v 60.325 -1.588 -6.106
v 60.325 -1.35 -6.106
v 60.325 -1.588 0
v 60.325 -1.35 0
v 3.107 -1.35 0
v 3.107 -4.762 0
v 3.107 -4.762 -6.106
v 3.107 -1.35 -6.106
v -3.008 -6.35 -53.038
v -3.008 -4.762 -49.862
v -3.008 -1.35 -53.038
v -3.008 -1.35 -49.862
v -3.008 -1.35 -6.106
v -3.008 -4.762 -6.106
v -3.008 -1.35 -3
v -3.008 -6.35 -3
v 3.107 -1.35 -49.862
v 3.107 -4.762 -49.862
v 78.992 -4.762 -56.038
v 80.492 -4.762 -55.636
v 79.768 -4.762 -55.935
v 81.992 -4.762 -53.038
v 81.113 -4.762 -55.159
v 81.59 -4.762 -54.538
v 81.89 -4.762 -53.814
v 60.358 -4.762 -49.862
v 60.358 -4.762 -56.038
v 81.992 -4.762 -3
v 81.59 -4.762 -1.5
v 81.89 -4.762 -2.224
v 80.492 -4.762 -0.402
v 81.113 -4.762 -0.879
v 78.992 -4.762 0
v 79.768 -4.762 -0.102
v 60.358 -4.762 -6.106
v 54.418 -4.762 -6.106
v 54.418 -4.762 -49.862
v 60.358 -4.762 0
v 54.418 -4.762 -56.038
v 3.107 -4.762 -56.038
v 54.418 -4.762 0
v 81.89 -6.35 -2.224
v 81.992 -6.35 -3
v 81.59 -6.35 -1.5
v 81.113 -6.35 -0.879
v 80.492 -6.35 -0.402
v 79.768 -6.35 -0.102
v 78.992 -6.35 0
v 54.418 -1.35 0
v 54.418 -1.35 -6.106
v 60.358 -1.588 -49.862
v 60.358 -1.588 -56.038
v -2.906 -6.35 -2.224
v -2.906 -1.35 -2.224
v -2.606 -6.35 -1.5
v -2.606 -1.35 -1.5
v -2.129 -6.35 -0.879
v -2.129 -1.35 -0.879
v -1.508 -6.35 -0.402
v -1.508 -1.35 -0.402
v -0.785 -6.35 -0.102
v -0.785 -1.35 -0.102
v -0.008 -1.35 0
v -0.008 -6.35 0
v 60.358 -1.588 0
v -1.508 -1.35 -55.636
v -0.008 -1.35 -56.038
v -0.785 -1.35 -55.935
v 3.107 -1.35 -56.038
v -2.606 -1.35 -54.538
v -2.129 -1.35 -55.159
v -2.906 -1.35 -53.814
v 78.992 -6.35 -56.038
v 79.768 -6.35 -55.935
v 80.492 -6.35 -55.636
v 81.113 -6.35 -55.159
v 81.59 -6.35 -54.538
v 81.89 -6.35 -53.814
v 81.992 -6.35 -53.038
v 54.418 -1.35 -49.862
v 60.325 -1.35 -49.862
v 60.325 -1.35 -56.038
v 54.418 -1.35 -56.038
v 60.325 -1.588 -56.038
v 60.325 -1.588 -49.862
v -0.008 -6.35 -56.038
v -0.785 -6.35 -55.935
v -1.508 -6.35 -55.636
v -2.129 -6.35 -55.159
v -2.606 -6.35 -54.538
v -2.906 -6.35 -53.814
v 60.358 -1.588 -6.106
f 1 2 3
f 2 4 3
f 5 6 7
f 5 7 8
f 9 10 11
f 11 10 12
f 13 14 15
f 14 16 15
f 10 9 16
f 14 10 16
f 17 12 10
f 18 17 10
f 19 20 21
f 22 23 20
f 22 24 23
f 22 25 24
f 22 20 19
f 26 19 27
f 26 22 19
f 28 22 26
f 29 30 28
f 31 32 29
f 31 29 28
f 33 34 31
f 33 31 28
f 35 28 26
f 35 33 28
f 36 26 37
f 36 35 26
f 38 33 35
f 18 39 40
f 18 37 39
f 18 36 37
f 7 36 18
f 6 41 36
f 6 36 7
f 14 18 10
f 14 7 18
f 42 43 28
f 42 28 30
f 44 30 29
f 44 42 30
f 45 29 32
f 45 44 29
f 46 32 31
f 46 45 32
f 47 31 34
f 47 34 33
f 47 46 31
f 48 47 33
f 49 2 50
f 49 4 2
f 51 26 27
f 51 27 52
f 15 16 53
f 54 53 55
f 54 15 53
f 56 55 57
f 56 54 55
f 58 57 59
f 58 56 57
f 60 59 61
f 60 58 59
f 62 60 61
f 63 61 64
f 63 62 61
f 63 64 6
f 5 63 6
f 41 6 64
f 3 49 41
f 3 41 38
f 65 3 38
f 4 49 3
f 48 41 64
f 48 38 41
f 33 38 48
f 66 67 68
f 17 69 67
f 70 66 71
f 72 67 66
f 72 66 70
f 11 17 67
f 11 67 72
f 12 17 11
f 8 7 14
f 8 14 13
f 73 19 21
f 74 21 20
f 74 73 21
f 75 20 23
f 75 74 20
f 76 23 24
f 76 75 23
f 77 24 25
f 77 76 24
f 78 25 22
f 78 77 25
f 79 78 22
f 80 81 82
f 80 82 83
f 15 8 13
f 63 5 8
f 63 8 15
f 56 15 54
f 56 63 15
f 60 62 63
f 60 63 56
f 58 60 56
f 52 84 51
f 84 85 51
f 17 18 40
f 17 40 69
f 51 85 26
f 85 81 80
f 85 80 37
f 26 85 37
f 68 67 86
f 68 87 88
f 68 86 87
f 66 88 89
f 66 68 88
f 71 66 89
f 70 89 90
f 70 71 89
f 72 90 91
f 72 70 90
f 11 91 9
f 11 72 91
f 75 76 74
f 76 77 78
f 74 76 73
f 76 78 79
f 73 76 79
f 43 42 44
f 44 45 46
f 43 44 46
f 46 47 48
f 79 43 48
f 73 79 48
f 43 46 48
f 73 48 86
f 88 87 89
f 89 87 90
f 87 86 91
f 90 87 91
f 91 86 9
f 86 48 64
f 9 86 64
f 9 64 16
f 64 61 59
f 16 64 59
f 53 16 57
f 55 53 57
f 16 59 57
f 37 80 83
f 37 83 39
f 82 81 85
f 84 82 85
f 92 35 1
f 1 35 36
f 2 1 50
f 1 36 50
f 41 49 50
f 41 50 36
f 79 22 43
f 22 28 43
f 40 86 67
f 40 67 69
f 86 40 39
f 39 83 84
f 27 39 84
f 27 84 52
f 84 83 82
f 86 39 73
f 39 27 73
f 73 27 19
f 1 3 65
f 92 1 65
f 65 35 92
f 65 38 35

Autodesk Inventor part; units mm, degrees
ref_plane "YZ Plane" through (0, 0, 0) normal (1, 0, 0) x (0, 1, 0)
ref_plane "XZ Plane" through (0, 0, 0) normal (0, 1, 0) x (-1, 0, 0)
ref_plane "XY Plane" through (0, 0, 0) normal (0, 0, 1) x (1, 0, 0)
sketch "Sketch1" plane through (0, 0, 0) normal (0, 0, 1) x (1, 0, 0)
  line L0 (-3.0081, 0) -> (-3.0081, -1.35)
  line L1 (-0.0086, -1.35) -> (-3.0081, -1.35) projected
  line L2 (81.9919, -1.35) -> (78.9914, -1.35) projected
  line L3 (78.9914, -1.35) -> (-0.0086, -1.35) projected
  line L4 (-3.0081, -1.35) -> (81.9919, -1.35)
  line L5 (81.9919, -1.35) -> (81.9919, -6.35)
  line L6 (81.9919, -6.35) -> (-3.0081, -6.35)
  line L7 (-3.0081, -6.35) -> (-3.0081, -1.35)
  line L8 (0, 12.6) -> (65.5305, 12.6) projected
  line L9 (0, 0) -> (0, 12.6) projected
  line L10 (0, 0) -> (3.1074, 0) projected
  line L11 (3.1074, 0) -> (3.1074, 4.1) projected
  line L12 (3.1074, 4.1) -> (39.418, 4.1) projected
  line L13 (39.418, 4.1) -> (39.418, 6.6) projected
  line L14 (39.418, 6.6) -> (54.418, 6.6) projected
  line L15 (54.418, 6.6) -> (54.418, 0) projected
  line L16 (54.418, 0) -> (60.3584, 0) projected
  line L17 (60.3584, 0) -> (60.3584, 1.0153) projected
  line L18 (60.3584, 1.0153) -> (65.5305, 1.0153) projected
  line L19 (65.5305, 1.0153) -> (65.5305, 12.6) projected
  dimension "d0" = 5
extrude "Extrusion1" add sketch "Sketch1" against normal blind 56.0375 contours L3 L2 L5 L6 L7 L1
fillet "Fillet1" radius 3 4 edges at (-3.0081, -3.85, 0) (-3.0081, -3.85, -56.0375) (81.9919, -3.85, 0) (81.9919, -3.85, -56.0375)
sketch "Sketch2" plane through (0, 0, 0) normal (0, 0, 1) x (1, 0, 0)
  line L0 (0, 12.6) -> (65.5305, 12.6) projected
  line L1 (0, 0) -> (0, 12.6) projected
  line L2 (0, 0) -> (3.1074, 0) projected
  line L3 (3.1074, 0) -> (3.1074, 4.1) projected
  line L4 (3.1074, 4.1) -> (39.418, 4.1) projected
  line L5 (39.418, 4.1) -> (39.418, 6.6) projected
  line L6 (39.418, 6.6) -> (54.418, 6.6) projected
  line L7 (54.418, 6.6) -> (54.418, 0) projected
  line L8 (54.418, 0) -> (60.3584, 0) projected
  line L9 (60.3584, 0) -> (60.3584, 1.0153) projected
  line L10 (60.3584, 1.0153) -> (65.5305, 1.0153) projected
  line L11 (65.5305, 1.0153) -> (65.5305, 12.6) projected
  line L12 (-0.0081, -1.35) -> (78.9919, -1.35) projected
  line L13 (3.1074, -1.35) -> (54.418, -1.35)
  line L14 (54.418, -1.35) -> (54.418, -4.7625)
  line L15 (54.418, -4.7625) -> (3.1074, -4.7625)
  line L16 (3.1074, -4.7625) -> (3.1074, -1.35)
  line L17 (60.3584, -1.5875) -> (89.6562, -1.5875)
  line L18 (89.6562, -1.5875) -> (89.6562, -4.7625)
  line L19 (89.6562, -4.7625) -> (60.3584, -4.7625)
  line L20 (60.3584, -4.7625) -> (60.3584, -1.5875)
extrude "Extrusion2" cut sketch "Sketch2" against normal blind 56.0375 contours L12 L14 L15 L16 | L17 L18 L19 L20
sketch "Sketch3" plane through (-3.0081, -6.35, -53.0375) normal (-1, 0, 0) x (0, 0, 1)
  line L0 (53.0375, 1.5875) -> (-3, 1.5875) projected
  line L1 (3.175, 1.5875) -> (46.9313, 1.5875)
  line L2 (46.9313, 1.5875) -> (46.9313, 6.35)
  line L3 (46.9313, 6.35) -> (3.175, 6.35)
  line L4 (3.175, 6.35) -> (3.175, 1.5875)
  point P0 (53.0375, 6.35)
extrude "Extrusion3" cut sketch "Sketch3" against normal blind 89.375
sketch "Sketch4" plane through (0, 0, 0) normal (0, 0, 1) x (1, 0, 0)
  line L0 (60.325, -1.5875) -> (82.55, -1.5875)
  line L1 (82.55, -1.5875) -> (82.55, 0)
  line L2 (82.55, 0) -> (60.325, 0)
  line L3 (60.325, 0) -> (60.325, -1.5875)
  point P0 (0, 0)
extrude "Extrusion4" cut sketch "Sketch4" against normal blind 89.375
properties part number "Heatsink Base" material "Gold"
